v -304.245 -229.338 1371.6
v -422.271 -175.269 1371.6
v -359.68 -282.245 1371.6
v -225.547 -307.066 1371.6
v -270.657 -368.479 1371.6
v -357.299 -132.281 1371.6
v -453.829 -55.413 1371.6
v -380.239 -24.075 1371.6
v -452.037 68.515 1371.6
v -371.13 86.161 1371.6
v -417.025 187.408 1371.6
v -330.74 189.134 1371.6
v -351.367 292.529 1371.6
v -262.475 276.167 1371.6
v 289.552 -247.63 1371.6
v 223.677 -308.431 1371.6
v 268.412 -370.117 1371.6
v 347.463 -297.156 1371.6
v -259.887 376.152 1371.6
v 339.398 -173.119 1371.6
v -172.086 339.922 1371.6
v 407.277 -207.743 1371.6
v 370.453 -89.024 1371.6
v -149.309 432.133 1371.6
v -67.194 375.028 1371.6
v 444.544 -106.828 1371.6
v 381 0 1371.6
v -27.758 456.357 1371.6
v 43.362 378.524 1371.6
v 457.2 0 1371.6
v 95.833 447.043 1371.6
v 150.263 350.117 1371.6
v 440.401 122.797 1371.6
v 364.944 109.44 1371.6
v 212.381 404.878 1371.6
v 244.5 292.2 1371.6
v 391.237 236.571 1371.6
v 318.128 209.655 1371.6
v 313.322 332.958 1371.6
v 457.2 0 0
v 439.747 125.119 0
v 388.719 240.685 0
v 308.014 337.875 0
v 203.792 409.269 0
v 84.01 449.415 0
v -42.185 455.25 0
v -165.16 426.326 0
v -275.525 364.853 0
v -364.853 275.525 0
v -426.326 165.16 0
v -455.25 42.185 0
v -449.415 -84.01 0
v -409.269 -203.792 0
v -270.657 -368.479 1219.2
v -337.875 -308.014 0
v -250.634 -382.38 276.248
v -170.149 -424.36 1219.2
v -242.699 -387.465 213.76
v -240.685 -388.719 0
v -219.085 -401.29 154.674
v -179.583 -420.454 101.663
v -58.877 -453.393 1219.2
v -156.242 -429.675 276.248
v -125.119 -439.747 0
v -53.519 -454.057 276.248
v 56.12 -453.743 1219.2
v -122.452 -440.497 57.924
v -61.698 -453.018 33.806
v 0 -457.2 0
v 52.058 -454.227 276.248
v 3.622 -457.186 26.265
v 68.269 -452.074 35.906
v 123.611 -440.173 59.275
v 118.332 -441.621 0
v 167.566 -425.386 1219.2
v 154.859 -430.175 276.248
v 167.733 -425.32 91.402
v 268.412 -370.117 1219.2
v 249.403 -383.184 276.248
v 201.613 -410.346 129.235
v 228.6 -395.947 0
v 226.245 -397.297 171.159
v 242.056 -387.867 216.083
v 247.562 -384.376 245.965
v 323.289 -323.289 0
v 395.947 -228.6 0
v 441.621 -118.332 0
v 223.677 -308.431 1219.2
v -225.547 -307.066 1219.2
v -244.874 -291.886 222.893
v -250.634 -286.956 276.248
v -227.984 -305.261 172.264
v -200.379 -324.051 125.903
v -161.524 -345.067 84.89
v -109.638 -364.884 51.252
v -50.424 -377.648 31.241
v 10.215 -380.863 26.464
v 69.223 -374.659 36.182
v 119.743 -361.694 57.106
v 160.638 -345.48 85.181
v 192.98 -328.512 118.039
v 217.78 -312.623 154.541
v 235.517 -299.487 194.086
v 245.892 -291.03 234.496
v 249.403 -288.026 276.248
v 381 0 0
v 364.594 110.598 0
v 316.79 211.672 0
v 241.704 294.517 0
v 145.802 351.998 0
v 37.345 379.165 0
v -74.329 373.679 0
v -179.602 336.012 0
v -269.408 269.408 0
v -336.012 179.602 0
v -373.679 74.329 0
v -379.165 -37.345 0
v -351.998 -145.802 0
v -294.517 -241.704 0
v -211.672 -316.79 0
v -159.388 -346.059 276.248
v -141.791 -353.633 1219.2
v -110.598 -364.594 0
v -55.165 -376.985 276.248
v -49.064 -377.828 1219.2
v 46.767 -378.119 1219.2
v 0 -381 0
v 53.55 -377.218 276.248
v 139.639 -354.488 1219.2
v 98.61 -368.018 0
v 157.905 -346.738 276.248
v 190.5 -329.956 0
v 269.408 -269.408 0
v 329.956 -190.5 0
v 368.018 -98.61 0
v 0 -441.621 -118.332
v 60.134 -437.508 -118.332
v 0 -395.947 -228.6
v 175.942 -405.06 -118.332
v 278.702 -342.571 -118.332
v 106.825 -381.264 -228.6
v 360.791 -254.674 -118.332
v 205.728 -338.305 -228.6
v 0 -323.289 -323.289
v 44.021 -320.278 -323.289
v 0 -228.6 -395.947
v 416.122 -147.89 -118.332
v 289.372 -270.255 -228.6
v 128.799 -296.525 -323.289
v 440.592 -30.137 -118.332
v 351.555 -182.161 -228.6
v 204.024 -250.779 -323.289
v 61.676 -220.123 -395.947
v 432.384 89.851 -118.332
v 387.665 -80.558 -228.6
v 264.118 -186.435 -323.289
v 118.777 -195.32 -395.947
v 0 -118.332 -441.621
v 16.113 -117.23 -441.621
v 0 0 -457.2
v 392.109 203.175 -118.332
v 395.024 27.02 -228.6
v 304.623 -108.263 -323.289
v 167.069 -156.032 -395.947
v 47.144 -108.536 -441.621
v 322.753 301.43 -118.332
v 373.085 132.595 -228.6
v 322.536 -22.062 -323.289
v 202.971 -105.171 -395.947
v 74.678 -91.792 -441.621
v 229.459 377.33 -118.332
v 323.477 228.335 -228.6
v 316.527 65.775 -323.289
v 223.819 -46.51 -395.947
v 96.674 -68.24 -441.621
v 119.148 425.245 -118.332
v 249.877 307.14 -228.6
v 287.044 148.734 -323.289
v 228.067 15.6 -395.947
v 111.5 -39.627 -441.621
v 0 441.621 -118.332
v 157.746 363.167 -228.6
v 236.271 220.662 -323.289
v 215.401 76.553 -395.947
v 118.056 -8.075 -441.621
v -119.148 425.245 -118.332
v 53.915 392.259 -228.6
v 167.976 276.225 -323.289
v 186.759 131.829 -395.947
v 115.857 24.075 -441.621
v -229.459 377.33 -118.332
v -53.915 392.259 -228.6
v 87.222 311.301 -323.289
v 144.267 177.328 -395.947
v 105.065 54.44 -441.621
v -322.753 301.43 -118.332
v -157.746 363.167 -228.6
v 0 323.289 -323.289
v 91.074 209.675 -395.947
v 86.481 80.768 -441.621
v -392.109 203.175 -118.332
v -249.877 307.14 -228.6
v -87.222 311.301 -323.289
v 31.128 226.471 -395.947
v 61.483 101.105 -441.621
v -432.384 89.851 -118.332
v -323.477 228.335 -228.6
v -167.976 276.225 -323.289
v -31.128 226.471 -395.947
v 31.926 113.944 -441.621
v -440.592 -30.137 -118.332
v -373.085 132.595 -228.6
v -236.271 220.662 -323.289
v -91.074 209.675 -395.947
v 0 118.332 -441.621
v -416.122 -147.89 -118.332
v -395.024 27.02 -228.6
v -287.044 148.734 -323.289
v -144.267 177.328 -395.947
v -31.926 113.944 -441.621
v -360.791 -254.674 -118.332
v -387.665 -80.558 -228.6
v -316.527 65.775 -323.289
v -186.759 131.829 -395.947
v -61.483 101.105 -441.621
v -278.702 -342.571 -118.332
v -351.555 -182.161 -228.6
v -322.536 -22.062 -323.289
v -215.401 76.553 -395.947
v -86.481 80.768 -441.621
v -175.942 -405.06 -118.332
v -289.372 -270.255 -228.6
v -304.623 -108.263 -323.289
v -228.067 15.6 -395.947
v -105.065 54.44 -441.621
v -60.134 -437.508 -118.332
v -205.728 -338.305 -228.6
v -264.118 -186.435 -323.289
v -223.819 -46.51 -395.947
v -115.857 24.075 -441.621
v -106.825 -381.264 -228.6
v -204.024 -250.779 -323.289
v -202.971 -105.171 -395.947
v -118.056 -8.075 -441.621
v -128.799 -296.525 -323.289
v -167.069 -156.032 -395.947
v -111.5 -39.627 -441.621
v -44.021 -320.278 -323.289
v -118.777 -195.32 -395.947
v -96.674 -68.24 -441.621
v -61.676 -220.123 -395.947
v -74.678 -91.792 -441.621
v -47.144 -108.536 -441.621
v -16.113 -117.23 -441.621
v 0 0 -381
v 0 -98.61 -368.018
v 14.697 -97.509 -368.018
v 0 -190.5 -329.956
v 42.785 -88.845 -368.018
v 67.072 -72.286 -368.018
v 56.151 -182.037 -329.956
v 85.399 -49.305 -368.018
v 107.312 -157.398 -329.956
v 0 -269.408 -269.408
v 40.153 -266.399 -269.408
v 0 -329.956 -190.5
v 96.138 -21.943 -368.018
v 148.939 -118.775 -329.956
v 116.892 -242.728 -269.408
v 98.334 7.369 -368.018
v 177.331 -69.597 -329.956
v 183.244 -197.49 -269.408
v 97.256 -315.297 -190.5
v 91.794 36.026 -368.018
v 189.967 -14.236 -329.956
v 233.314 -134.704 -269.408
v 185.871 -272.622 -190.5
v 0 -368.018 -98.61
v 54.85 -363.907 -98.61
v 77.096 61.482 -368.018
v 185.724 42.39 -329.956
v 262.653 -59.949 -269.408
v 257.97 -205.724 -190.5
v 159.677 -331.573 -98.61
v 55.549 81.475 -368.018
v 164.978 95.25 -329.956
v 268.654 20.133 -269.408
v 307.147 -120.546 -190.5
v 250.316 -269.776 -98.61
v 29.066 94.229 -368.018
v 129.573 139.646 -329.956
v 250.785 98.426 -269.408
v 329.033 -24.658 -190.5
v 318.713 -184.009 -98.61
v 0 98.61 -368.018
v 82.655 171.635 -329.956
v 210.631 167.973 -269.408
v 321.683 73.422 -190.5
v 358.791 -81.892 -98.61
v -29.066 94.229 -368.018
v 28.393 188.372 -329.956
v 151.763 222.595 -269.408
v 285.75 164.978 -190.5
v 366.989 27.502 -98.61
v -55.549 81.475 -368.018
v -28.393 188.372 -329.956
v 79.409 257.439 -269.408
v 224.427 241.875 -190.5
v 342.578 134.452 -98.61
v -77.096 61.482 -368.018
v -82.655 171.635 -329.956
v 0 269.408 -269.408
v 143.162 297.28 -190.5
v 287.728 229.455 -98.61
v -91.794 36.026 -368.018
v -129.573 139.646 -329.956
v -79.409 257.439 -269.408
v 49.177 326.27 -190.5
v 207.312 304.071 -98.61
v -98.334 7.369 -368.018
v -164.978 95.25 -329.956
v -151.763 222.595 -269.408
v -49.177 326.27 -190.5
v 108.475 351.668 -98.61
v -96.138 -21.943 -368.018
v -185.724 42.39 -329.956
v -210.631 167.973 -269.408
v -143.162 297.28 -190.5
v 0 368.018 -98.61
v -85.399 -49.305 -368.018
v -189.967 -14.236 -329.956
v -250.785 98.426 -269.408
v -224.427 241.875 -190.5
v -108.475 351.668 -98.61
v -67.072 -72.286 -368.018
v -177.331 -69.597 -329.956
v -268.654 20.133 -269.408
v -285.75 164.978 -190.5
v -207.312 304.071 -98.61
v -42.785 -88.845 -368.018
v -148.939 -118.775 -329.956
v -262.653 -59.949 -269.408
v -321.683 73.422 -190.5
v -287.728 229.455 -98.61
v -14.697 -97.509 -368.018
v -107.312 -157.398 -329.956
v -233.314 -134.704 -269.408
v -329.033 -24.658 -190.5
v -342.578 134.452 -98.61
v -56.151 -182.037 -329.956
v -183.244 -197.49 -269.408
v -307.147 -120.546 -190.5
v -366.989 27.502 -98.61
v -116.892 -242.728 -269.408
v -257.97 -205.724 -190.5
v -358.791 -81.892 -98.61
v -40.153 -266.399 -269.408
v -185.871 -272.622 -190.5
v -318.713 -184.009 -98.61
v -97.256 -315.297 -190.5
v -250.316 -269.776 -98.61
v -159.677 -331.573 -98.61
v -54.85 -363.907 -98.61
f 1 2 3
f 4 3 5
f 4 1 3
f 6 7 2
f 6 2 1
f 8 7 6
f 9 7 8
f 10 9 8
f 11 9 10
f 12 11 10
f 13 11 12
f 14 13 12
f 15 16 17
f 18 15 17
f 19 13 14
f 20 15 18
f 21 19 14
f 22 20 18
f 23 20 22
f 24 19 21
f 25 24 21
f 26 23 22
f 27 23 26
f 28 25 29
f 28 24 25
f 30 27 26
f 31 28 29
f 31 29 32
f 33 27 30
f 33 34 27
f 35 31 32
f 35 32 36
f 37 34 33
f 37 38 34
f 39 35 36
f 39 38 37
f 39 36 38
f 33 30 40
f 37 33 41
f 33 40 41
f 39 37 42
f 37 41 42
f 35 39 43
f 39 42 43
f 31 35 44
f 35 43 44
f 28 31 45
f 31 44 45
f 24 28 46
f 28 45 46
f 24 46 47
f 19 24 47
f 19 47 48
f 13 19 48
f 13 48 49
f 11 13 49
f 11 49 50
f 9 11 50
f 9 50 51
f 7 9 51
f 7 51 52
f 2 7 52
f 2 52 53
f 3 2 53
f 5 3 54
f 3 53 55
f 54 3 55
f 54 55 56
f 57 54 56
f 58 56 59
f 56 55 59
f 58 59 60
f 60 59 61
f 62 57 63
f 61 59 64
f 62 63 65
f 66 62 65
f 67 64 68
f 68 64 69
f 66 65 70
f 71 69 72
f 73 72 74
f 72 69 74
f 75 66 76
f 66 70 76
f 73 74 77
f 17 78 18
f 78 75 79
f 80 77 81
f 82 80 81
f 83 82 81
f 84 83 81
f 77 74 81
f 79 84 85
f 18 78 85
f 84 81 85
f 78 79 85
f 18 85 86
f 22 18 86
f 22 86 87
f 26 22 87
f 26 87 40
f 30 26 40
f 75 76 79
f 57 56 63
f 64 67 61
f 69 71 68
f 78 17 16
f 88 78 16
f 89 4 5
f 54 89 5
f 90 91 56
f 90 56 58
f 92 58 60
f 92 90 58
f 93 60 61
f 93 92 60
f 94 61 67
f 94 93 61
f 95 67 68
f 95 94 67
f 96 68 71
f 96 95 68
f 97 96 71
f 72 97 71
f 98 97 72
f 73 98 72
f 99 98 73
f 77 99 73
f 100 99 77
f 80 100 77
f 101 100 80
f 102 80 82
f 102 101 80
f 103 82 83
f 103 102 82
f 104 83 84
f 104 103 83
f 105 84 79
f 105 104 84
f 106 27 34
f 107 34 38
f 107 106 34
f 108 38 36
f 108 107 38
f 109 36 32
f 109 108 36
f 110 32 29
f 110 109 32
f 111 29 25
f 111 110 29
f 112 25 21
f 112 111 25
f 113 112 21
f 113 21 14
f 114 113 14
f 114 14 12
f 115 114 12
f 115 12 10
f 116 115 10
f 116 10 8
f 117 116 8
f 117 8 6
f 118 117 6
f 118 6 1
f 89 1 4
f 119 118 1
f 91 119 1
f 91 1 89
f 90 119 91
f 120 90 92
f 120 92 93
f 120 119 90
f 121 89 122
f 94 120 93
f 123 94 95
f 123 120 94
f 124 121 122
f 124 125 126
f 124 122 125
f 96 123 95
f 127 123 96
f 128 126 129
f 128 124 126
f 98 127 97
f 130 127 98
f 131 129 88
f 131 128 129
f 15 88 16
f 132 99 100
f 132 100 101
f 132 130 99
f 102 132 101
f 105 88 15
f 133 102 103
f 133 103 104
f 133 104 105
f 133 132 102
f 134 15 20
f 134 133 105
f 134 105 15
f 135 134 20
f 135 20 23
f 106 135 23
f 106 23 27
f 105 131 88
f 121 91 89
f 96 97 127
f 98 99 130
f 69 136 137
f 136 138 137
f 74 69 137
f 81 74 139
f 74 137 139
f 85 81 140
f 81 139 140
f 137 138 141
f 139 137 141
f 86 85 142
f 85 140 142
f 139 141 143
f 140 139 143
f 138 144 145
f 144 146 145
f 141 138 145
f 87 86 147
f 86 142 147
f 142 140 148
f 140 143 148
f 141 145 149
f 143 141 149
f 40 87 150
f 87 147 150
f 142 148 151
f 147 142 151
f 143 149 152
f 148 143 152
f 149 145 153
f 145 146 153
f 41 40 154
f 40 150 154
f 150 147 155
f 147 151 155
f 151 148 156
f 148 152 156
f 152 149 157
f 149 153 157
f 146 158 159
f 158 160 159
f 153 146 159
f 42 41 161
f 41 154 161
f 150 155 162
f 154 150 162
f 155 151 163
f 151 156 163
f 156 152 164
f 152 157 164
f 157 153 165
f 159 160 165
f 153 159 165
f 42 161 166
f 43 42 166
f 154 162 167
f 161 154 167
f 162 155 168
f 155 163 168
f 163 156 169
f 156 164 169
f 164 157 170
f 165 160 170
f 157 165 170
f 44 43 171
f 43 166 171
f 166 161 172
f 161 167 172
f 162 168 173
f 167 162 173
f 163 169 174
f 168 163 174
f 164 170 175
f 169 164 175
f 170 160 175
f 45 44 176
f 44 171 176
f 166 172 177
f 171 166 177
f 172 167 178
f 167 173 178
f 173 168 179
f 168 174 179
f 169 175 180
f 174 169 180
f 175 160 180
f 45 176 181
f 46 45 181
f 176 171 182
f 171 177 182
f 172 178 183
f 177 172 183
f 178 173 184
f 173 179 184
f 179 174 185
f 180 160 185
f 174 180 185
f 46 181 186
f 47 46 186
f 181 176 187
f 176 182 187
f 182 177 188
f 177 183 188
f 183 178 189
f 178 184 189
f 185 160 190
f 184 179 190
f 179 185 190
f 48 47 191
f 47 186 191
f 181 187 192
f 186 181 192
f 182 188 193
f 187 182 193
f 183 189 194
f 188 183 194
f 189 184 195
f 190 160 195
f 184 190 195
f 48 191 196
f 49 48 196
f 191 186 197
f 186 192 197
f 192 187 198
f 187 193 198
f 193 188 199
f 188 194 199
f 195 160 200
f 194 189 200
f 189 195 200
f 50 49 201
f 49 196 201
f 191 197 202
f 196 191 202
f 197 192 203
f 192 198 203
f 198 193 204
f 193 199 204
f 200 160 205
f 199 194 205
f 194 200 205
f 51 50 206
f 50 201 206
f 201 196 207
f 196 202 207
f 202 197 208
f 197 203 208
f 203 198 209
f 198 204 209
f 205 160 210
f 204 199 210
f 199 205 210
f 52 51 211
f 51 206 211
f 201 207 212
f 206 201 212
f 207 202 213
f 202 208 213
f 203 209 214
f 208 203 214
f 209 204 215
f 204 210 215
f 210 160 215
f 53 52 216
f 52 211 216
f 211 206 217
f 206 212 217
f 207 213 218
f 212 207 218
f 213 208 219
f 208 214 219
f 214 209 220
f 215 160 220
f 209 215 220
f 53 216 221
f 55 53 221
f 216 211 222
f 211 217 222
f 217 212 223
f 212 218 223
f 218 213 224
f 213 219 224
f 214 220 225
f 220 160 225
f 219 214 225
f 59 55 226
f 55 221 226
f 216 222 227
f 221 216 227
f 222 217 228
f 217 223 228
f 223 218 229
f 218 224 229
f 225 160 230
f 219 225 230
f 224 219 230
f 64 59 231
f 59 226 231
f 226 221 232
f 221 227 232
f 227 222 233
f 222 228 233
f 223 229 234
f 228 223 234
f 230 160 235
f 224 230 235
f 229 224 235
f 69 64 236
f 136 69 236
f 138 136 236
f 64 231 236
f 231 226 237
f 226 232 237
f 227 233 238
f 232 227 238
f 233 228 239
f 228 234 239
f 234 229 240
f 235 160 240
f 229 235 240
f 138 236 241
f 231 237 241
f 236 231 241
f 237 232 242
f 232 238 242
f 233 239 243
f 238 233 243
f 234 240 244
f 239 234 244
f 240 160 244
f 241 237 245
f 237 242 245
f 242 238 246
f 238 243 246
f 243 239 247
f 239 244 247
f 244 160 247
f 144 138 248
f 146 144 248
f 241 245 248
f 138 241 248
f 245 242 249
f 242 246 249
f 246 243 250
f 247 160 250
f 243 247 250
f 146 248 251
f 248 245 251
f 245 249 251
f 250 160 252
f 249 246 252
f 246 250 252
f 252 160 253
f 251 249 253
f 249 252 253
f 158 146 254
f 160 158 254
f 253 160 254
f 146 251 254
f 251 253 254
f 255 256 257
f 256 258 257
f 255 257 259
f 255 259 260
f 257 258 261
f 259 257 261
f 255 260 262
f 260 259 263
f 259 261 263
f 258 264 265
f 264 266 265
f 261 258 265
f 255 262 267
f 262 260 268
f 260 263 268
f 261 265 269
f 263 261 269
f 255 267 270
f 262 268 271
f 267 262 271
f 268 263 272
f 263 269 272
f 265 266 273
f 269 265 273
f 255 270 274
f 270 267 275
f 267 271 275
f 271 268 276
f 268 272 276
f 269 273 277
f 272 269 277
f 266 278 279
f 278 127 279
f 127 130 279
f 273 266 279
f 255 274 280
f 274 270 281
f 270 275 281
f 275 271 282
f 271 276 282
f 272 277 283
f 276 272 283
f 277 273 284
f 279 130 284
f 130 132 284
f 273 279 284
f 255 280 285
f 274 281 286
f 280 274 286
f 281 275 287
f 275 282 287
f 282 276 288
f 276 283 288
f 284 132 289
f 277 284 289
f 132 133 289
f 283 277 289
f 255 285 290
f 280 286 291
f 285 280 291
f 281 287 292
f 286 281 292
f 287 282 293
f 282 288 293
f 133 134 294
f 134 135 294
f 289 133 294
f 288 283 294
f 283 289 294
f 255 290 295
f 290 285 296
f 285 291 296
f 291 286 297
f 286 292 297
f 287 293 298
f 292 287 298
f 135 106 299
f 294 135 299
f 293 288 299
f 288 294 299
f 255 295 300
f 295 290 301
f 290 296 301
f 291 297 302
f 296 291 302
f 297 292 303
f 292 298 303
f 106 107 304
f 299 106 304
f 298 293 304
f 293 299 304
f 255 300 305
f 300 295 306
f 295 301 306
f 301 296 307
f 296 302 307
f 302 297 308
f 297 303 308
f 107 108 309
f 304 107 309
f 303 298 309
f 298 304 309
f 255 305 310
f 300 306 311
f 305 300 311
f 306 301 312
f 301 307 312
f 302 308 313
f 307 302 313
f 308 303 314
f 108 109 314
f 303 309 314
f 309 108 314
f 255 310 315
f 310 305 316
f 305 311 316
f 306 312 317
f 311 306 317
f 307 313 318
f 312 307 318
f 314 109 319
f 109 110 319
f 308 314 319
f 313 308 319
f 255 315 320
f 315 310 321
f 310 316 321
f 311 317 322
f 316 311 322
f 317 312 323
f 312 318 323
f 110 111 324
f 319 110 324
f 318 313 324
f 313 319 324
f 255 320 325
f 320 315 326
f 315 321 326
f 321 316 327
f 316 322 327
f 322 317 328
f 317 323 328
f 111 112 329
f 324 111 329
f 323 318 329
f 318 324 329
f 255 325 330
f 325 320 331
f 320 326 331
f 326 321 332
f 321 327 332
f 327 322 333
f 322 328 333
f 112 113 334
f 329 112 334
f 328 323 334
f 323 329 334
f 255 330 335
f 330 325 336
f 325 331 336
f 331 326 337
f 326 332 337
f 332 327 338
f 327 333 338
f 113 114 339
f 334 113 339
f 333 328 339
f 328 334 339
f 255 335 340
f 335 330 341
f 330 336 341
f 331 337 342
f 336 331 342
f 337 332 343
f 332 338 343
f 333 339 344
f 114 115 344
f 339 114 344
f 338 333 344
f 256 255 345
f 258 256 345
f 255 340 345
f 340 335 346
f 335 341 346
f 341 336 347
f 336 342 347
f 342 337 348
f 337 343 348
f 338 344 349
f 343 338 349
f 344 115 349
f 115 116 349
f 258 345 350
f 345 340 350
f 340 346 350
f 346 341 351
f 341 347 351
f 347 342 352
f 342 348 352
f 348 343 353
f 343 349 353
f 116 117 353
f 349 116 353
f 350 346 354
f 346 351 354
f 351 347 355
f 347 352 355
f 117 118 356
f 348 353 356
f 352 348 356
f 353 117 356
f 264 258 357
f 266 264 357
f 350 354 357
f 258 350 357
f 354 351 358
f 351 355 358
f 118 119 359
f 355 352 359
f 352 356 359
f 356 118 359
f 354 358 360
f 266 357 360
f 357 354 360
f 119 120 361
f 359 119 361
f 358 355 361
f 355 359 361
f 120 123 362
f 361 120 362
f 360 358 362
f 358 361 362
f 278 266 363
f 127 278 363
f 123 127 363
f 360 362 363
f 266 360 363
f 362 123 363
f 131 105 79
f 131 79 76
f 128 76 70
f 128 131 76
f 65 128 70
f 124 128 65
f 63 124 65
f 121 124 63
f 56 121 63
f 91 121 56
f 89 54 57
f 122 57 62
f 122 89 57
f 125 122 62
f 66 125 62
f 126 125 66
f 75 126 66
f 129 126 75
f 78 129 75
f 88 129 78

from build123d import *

# Parameters (mm, degrees)
F0_R     = 457.2
F0_R_2   = 381
F1_DEPTH = 1371.6
F5_DEPTH = 457.2
F7_START = 1219.2
F7_DEPTH = 152.4


with BuildPart() as f1:
    # F0 (on Top) → F1 (new body)
    with BuildSketch(Plane.XY):
        Circle(F0_R)
        Circle(F0_R_2, mode=Mode.SUBTRACT)
    extrude(amount=F1_DEPTH)

    # F2 (on Right) → F3 (revolve)
    with BuildSketch(Plane.YZ):
        with BuildLine():
            ThreePointArc((0, -381), (-269.4076836321, -269.4076836321), (-381, 0))
            Line((-381, 0), (-457.2, 0))
            ThreePointArc((-457.2, 0), (-323.2892203585, -323.2892203585), (0, -457.2))
            Line((0, -457.2), (0, -381))
        make_face()
    revolve(axis=Axis((0, 0, -419.1), (0, 0, 1)))

    # F4 (on Front) → F5 (cut)
    with BuildSketch(Plane.XZ):
        with BuildLine():
            ThreePointArc((-250.6338357925, 276.2475907803), (-0.6155371666, 26.2292921543), (249.4027614594, 276.2475907803))
            Line((249.4027614594, 276.2475907803), (-250.6338357925, 276.2475907803))
        make_face()
    extrude(amount=F5_DEPTH, mode=Mode.SUBTRACT)

    # F6 (on Top) → F7 (cut)
    with BuildSketch(Plane.XY.offset(F7_START)):
        with BuildLine():
            Line((268.4118130728, -370.1174659523), (0, 0))
            Line((0, 0), (-270.6568666844, -368.4789010467))
            ThreePointArc((-270.6568666844, -368.4789010467), (-1.3897086627, -457.1978879105), (268.4118130728, -370.1174659523))
        make_face()
    extrude(amount=F7_DEPTH, mode=Mode.SUBTRACT)


solid = f1.part
